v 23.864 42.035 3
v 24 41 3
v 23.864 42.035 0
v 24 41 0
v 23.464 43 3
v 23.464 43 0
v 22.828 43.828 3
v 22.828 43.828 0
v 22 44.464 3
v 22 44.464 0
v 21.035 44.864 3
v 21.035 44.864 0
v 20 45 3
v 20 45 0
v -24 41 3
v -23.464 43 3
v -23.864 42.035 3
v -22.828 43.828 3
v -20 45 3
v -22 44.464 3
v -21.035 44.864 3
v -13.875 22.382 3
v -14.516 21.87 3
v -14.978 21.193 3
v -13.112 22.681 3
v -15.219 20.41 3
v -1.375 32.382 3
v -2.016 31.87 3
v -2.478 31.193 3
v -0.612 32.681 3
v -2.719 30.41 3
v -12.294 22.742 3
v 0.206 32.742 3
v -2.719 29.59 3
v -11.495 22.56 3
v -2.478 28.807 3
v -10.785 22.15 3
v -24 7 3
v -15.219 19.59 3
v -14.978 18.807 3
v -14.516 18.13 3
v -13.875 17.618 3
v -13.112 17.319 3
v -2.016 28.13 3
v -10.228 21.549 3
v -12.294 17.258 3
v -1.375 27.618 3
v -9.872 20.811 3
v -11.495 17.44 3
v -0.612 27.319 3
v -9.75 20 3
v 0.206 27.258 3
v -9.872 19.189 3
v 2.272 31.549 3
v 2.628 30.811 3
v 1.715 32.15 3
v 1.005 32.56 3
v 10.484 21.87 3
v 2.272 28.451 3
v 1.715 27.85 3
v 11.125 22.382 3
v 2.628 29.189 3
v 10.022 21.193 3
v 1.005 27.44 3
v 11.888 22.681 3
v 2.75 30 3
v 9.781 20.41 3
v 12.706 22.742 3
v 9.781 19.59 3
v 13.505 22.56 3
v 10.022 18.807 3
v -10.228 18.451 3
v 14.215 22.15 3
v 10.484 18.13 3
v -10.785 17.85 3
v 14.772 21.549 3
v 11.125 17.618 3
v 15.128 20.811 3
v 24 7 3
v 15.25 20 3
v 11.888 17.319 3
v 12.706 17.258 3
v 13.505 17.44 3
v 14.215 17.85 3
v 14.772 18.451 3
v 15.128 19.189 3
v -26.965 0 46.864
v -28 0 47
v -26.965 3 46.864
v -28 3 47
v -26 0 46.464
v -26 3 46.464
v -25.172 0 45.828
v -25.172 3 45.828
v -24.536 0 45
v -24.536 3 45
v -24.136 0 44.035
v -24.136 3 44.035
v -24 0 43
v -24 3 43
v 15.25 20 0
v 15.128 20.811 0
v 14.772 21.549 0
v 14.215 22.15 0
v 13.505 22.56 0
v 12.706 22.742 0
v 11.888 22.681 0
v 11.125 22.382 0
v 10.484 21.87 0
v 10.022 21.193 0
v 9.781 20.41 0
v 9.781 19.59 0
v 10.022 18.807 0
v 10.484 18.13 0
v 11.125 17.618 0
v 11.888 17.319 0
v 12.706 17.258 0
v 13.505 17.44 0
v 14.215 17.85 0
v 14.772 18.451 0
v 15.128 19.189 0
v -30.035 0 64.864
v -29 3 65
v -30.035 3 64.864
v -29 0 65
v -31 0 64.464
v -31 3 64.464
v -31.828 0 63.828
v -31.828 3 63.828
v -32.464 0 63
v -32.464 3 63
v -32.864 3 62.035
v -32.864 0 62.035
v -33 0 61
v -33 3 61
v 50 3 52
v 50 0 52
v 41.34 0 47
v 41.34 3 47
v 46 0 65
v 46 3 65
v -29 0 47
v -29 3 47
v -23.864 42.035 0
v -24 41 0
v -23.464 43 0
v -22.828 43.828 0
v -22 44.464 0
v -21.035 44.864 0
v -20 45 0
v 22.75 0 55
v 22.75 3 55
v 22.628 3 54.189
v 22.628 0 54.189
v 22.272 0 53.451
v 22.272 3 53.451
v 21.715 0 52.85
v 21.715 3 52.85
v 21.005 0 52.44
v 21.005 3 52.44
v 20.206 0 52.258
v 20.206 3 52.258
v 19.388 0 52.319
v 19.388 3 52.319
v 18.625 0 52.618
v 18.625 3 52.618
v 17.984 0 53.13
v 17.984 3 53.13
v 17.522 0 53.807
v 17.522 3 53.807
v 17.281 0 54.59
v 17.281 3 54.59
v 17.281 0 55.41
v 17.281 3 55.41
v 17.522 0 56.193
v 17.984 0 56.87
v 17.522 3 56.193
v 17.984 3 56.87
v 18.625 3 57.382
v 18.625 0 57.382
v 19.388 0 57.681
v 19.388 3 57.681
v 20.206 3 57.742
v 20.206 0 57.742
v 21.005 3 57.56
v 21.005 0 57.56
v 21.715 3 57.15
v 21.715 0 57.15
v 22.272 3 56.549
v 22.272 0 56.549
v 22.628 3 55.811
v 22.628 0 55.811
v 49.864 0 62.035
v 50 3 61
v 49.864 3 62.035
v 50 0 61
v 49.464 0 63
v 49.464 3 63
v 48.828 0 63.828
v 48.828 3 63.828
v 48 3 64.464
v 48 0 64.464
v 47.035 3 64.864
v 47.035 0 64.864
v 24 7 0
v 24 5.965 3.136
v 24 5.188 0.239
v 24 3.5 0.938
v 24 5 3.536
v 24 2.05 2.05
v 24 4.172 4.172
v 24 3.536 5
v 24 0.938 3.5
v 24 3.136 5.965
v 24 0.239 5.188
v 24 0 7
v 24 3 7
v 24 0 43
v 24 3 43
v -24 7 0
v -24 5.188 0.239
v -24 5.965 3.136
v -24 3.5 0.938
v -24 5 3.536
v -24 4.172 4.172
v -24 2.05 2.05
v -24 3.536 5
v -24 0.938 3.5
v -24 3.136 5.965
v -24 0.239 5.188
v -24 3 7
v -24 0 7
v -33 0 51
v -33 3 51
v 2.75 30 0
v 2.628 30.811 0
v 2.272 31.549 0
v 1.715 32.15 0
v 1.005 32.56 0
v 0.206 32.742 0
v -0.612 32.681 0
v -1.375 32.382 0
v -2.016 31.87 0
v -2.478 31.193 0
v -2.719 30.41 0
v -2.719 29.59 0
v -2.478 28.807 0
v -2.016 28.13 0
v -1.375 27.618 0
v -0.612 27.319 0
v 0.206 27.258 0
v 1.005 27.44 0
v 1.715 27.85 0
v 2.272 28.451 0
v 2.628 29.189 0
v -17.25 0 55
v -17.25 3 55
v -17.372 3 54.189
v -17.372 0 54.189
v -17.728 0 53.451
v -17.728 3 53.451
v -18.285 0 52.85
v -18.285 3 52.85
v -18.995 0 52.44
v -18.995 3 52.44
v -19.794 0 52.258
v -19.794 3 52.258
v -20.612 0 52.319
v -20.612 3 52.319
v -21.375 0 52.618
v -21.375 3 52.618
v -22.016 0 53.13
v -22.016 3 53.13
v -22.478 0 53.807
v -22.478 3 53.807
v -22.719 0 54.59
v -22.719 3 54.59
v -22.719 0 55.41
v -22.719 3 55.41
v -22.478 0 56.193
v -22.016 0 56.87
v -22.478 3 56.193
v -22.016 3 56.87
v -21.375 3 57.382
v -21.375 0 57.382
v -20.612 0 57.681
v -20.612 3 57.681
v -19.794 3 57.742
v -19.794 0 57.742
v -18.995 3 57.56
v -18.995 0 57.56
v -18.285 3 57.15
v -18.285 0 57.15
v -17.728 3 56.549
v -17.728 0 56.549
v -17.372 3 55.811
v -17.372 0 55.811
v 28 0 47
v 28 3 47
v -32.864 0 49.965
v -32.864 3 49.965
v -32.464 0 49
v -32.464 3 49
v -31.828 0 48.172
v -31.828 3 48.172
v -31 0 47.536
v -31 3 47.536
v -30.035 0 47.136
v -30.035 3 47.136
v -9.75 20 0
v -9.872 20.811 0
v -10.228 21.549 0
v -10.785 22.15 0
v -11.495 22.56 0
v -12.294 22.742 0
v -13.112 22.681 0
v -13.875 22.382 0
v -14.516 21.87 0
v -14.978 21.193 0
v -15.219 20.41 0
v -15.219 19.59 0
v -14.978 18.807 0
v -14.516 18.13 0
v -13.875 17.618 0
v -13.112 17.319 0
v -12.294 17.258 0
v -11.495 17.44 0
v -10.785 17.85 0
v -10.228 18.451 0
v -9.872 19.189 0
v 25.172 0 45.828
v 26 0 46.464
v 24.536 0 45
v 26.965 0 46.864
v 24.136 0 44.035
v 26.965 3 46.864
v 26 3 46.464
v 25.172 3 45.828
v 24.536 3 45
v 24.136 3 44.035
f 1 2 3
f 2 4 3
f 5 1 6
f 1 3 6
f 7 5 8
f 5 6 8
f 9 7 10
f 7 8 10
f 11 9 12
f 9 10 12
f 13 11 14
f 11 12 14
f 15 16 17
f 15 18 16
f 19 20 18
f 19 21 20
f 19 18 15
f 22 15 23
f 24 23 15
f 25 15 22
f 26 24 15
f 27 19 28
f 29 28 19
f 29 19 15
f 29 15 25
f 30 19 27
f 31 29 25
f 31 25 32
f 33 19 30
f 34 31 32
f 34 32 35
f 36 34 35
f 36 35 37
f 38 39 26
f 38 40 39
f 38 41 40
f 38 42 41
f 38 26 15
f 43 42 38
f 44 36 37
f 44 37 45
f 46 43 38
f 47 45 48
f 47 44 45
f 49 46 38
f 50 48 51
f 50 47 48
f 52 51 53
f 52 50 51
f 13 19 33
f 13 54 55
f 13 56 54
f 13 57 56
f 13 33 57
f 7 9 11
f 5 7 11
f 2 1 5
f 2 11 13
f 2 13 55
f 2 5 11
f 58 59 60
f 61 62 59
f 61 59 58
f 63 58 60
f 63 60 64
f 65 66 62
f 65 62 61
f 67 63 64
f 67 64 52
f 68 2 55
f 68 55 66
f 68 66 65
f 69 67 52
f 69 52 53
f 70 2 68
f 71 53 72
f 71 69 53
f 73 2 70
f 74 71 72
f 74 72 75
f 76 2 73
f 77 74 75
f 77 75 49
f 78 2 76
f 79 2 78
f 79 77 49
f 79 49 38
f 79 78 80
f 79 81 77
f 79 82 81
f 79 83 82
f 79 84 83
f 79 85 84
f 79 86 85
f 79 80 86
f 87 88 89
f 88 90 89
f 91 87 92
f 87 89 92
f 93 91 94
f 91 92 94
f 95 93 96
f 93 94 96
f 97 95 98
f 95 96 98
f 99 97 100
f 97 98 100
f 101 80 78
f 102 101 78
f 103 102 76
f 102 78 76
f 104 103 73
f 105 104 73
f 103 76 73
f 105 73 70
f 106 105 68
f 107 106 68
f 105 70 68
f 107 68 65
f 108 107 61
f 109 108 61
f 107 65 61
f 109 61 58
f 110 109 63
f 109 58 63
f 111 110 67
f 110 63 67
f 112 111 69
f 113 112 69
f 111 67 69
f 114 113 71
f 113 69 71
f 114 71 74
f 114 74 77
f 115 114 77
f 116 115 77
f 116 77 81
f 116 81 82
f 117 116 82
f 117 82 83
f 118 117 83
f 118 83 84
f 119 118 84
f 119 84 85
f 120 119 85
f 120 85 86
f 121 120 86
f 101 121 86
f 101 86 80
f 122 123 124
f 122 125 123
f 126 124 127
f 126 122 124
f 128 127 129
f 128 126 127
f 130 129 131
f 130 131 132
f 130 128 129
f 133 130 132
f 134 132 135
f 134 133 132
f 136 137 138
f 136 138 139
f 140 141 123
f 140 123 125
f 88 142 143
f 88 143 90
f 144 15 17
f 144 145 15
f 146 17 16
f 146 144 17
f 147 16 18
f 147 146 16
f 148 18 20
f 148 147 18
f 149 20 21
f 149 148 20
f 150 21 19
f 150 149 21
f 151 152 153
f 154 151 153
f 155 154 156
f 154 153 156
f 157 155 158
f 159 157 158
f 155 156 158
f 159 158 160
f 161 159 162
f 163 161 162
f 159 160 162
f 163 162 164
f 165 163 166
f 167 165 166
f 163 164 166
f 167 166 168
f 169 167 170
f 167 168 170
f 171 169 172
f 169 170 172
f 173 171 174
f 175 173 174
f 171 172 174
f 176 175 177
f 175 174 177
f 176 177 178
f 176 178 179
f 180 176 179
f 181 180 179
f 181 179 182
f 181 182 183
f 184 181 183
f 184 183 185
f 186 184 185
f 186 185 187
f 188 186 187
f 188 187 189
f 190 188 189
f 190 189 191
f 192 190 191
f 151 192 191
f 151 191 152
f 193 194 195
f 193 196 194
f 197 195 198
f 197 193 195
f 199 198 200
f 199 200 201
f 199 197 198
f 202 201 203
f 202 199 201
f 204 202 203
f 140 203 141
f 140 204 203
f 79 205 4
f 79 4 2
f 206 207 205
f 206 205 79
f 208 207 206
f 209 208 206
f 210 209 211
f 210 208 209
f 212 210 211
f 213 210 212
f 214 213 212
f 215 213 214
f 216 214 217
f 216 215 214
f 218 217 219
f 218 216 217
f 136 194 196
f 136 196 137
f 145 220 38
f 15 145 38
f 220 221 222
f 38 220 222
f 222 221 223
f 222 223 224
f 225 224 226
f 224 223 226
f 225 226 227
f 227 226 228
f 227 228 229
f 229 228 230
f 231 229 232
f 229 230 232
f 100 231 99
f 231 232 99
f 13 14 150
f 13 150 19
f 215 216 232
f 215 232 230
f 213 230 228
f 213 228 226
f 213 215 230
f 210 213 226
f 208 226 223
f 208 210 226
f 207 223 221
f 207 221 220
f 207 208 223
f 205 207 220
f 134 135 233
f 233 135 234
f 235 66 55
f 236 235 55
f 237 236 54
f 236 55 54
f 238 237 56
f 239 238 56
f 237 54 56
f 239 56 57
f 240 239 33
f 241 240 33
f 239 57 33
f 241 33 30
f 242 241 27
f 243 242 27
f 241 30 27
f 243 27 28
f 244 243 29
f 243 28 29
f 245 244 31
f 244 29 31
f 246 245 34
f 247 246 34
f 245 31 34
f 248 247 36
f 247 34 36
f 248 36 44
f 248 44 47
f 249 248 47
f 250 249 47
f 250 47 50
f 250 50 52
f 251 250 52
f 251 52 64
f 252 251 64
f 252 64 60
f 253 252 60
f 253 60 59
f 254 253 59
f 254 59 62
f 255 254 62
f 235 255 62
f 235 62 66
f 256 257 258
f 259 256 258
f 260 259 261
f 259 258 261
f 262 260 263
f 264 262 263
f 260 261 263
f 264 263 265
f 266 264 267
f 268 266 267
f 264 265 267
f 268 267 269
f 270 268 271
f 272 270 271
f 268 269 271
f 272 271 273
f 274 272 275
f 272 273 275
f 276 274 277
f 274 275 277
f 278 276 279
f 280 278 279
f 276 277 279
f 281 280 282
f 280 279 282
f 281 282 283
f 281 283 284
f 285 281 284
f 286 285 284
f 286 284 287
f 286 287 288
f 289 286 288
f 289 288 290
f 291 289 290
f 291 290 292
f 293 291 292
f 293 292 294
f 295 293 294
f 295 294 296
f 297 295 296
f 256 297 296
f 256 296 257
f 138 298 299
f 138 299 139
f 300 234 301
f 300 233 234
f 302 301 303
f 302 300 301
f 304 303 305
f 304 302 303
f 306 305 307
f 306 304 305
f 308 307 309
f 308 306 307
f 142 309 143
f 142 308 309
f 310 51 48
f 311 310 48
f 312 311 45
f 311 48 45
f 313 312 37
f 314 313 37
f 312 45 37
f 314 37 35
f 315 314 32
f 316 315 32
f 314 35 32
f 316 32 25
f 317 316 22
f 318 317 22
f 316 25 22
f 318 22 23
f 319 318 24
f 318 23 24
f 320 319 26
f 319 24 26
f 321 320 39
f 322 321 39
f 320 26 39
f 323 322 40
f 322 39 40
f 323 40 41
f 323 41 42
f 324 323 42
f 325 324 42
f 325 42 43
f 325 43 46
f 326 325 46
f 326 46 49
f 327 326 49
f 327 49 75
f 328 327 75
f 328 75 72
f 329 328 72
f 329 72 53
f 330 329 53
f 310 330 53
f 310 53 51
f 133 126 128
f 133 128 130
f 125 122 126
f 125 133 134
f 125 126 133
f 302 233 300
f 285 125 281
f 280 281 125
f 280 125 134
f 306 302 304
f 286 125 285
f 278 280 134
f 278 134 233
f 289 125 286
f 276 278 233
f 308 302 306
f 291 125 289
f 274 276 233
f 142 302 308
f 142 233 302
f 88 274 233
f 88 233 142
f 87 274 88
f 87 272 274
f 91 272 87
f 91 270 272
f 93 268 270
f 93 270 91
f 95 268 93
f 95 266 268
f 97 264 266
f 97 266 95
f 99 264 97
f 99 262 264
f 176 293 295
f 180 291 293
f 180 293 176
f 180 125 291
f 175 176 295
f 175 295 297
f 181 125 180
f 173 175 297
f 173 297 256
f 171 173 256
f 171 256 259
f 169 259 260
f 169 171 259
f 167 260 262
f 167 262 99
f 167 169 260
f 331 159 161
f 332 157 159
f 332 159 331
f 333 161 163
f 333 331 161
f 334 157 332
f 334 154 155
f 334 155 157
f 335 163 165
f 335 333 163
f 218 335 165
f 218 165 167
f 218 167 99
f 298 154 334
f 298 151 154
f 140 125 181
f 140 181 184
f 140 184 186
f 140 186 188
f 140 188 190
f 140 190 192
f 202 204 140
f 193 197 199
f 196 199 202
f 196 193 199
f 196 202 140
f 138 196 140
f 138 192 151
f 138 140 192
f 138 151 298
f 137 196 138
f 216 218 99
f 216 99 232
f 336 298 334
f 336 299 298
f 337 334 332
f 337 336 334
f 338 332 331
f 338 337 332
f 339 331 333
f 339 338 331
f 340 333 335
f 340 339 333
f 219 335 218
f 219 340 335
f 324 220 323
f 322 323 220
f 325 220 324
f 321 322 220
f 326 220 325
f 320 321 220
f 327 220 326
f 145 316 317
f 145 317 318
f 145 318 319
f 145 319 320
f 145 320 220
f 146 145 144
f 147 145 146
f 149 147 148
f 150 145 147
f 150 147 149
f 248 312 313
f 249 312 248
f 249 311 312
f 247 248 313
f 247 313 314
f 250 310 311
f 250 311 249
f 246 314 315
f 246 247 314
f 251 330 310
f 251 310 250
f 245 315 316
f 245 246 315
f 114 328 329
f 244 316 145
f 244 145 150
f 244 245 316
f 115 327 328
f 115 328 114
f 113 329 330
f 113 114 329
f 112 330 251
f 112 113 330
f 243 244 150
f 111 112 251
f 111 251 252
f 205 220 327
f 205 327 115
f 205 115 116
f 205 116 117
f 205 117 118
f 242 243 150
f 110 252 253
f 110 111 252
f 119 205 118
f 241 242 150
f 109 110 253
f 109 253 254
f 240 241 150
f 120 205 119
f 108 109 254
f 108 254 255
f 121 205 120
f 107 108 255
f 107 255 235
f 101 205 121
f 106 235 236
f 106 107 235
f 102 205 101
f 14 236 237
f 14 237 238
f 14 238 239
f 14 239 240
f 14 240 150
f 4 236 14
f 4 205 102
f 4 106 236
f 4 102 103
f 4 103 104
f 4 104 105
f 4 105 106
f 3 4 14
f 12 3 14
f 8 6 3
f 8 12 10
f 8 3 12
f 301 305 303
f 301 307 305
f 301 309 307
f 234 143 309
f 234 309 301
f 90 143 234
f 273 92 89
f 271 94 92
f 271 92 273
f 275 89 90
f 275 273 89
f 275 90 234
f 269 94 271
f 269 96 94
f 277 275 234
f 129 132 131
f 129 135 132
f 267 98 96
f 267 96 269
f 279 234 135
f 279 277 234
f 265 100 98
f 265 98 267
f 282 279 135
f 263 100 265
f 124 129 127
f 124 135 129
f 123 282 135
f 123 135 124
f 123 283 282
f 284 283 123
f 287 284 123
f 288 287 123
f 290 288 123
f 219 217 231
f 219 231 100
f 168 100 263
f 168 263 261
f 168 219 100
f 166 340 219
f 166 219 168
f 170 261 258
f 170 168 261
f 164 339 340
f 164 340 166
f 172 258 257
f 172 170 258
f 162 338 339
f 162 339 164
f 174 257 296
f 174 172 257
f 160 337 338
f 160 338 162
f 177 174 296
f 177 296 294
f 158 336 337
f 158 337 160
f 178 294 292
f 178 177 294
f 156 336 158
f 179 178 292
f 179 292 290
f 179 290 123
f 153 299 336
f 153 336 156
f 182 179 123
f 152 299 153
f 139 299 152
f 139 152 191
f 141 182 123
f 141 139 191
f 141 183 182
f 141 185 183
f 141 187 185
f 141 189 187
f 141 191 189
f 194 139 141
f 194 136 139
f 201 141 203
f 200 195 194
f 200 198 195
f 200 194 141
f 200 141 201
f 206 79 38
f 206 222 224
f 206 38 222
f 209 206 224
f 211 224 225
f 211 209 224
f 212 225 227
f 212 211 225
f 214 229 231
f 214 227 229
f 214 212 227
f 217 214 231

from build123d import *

# Parameters (mm, degrees)
ODGI_CIE_BAZOWE1_DEPTH     = 50
SZKIC6_W                   = 26
SZKIC6_H                   = 47
WYTNIJ_WYCI_GNI_CIE1_DEPTH = 94.541434669
OTW_R_POD_RUB_M51_D        = 5.5
OTW_R_POD_RUB_M52_D        = 5.5
SZKIC11_W                  = 17
SZKIC11_H                  = 18
WYTNIJ_WYCI_GNI_CIE2_DEPTH = 93.135769384
SFAZOWANIE1_SIZE           = 5
SFAZOWANIE1_SIZE2          = 8.660254038
ZAOKR_GLENIE1_R            = 4


# Sheet-metal steps are written as plain solids
with BuildPart() as part:
    # Szkic1 → Odgięcie bazowe1 (new, symmetric)
    with BuildSketch(Plane(origin=(0, 0, 0), x_dir=(0, 0, -1), z_dir=(1, 0, 0))):
        with BuildLine():
            Line((-65, 0), (-7, 0))
            ThreePointArc((-7, 0), (-2.050252532, 2.050252532), (0, 7))
            Line((0, 7), (0, 45))
            Line((0, 45), (-3, 45))
            Line((-3, 45), (-3, 7))
            ThreePointArc((-3, 7), (-4.171572875, 4.171572875), (-7, 3))
            Line((-7, 3), (-65, 3))
            Line((-65, 3), (-65, 0))
        make_face()
    extrude(amount=ODGI_CIE_BAZOWE1_DEPTH, both=True)

    # Szkic6 → Wytnij-wyciągnięcie1 (cut, through all)
    with BuildSketch(Plane.XZ):
        with Locations((37, 23.5)):
            Rectangle(SZKIC6_W, SZKIC6_H)
        with Locations((-37, 23.5)):
            Rectangle(SZKIC6_W, SZKIC6_H)
    extrude(amount=-WYTNIJ_WYCI_GNI_CIE1_DEPTH, mode=Mode.SUBTRACT)

    # Otwór pod śrubę M51 (through all)
    with Locations(Plane(origin=(0, 0, 0), x_dir=(-1, 0, 0), z_dir=(0, 0, -1))):
        with Locations((0, 30), (-12.5, 20), (12.5, 20)):
            Hole(OTW_R_POD_RUB_M51_D / 2)

    # Otwór pod śrubę M52 (through all)
    with Locations(Plane(origin=(0, 0, 0), x_dir=(-1, 0, 0), z_dir=(0, -1, 0))):
        with Locations((20, -55), (-20, -55)):
            Hole(OTW_R_POD_RUB_M52_D / 2)

    # Szkic11 → Wytnij-wyciągnięcie2 (cut, through all)
    with BuildSketch(Plane(origin=(0, 3, 0), x_dir=(1, 0, 0), z_dir=(0, 1, 0))):
        with Locations((-41.5, -56)):
            Rectangle(SZKIC11_W, SZKIC11_H)
    extrude(amount=-WYTNIJ_WYCI_GNI_CIE2_DEPTH, mode=Mode.SUBTRACT)

    # Sfazowanie1
    sfazowanie1_edges = [part.edges().sort_by_distance(p)[0] for p in [
        (50, 1.5, 47),
    ]]
    sfazowanie1_side = [part.faces().sort_by_distance(p)[0] for p in [
        (50, 1.5, 56),
    ]]
    chamfer(sfazowanie1_edges, length=SFAZOWANIE1_SIZE, length2=SFAZOWANIE1_SIZE2, reference=sfazowanie1_side[0])

    # Zaokrąglenie1
    zaokr_glenie1_edges = [part.edges().sort_by_distance(p)[0] for p in [
        (-33, 1.5, 47),
        (-33, 1.5, 65),
        (-24, 45, 1.5),
        (-24, 1.5, 47),
        (24, 1.5, 47),
        (24, 45, 1.5),
        (50, 1.5, 65),
    ]]
    fillet(zaokr_glenie1_edges, radius=ZAOKR_GLENIE1_R)


solid = part.part
